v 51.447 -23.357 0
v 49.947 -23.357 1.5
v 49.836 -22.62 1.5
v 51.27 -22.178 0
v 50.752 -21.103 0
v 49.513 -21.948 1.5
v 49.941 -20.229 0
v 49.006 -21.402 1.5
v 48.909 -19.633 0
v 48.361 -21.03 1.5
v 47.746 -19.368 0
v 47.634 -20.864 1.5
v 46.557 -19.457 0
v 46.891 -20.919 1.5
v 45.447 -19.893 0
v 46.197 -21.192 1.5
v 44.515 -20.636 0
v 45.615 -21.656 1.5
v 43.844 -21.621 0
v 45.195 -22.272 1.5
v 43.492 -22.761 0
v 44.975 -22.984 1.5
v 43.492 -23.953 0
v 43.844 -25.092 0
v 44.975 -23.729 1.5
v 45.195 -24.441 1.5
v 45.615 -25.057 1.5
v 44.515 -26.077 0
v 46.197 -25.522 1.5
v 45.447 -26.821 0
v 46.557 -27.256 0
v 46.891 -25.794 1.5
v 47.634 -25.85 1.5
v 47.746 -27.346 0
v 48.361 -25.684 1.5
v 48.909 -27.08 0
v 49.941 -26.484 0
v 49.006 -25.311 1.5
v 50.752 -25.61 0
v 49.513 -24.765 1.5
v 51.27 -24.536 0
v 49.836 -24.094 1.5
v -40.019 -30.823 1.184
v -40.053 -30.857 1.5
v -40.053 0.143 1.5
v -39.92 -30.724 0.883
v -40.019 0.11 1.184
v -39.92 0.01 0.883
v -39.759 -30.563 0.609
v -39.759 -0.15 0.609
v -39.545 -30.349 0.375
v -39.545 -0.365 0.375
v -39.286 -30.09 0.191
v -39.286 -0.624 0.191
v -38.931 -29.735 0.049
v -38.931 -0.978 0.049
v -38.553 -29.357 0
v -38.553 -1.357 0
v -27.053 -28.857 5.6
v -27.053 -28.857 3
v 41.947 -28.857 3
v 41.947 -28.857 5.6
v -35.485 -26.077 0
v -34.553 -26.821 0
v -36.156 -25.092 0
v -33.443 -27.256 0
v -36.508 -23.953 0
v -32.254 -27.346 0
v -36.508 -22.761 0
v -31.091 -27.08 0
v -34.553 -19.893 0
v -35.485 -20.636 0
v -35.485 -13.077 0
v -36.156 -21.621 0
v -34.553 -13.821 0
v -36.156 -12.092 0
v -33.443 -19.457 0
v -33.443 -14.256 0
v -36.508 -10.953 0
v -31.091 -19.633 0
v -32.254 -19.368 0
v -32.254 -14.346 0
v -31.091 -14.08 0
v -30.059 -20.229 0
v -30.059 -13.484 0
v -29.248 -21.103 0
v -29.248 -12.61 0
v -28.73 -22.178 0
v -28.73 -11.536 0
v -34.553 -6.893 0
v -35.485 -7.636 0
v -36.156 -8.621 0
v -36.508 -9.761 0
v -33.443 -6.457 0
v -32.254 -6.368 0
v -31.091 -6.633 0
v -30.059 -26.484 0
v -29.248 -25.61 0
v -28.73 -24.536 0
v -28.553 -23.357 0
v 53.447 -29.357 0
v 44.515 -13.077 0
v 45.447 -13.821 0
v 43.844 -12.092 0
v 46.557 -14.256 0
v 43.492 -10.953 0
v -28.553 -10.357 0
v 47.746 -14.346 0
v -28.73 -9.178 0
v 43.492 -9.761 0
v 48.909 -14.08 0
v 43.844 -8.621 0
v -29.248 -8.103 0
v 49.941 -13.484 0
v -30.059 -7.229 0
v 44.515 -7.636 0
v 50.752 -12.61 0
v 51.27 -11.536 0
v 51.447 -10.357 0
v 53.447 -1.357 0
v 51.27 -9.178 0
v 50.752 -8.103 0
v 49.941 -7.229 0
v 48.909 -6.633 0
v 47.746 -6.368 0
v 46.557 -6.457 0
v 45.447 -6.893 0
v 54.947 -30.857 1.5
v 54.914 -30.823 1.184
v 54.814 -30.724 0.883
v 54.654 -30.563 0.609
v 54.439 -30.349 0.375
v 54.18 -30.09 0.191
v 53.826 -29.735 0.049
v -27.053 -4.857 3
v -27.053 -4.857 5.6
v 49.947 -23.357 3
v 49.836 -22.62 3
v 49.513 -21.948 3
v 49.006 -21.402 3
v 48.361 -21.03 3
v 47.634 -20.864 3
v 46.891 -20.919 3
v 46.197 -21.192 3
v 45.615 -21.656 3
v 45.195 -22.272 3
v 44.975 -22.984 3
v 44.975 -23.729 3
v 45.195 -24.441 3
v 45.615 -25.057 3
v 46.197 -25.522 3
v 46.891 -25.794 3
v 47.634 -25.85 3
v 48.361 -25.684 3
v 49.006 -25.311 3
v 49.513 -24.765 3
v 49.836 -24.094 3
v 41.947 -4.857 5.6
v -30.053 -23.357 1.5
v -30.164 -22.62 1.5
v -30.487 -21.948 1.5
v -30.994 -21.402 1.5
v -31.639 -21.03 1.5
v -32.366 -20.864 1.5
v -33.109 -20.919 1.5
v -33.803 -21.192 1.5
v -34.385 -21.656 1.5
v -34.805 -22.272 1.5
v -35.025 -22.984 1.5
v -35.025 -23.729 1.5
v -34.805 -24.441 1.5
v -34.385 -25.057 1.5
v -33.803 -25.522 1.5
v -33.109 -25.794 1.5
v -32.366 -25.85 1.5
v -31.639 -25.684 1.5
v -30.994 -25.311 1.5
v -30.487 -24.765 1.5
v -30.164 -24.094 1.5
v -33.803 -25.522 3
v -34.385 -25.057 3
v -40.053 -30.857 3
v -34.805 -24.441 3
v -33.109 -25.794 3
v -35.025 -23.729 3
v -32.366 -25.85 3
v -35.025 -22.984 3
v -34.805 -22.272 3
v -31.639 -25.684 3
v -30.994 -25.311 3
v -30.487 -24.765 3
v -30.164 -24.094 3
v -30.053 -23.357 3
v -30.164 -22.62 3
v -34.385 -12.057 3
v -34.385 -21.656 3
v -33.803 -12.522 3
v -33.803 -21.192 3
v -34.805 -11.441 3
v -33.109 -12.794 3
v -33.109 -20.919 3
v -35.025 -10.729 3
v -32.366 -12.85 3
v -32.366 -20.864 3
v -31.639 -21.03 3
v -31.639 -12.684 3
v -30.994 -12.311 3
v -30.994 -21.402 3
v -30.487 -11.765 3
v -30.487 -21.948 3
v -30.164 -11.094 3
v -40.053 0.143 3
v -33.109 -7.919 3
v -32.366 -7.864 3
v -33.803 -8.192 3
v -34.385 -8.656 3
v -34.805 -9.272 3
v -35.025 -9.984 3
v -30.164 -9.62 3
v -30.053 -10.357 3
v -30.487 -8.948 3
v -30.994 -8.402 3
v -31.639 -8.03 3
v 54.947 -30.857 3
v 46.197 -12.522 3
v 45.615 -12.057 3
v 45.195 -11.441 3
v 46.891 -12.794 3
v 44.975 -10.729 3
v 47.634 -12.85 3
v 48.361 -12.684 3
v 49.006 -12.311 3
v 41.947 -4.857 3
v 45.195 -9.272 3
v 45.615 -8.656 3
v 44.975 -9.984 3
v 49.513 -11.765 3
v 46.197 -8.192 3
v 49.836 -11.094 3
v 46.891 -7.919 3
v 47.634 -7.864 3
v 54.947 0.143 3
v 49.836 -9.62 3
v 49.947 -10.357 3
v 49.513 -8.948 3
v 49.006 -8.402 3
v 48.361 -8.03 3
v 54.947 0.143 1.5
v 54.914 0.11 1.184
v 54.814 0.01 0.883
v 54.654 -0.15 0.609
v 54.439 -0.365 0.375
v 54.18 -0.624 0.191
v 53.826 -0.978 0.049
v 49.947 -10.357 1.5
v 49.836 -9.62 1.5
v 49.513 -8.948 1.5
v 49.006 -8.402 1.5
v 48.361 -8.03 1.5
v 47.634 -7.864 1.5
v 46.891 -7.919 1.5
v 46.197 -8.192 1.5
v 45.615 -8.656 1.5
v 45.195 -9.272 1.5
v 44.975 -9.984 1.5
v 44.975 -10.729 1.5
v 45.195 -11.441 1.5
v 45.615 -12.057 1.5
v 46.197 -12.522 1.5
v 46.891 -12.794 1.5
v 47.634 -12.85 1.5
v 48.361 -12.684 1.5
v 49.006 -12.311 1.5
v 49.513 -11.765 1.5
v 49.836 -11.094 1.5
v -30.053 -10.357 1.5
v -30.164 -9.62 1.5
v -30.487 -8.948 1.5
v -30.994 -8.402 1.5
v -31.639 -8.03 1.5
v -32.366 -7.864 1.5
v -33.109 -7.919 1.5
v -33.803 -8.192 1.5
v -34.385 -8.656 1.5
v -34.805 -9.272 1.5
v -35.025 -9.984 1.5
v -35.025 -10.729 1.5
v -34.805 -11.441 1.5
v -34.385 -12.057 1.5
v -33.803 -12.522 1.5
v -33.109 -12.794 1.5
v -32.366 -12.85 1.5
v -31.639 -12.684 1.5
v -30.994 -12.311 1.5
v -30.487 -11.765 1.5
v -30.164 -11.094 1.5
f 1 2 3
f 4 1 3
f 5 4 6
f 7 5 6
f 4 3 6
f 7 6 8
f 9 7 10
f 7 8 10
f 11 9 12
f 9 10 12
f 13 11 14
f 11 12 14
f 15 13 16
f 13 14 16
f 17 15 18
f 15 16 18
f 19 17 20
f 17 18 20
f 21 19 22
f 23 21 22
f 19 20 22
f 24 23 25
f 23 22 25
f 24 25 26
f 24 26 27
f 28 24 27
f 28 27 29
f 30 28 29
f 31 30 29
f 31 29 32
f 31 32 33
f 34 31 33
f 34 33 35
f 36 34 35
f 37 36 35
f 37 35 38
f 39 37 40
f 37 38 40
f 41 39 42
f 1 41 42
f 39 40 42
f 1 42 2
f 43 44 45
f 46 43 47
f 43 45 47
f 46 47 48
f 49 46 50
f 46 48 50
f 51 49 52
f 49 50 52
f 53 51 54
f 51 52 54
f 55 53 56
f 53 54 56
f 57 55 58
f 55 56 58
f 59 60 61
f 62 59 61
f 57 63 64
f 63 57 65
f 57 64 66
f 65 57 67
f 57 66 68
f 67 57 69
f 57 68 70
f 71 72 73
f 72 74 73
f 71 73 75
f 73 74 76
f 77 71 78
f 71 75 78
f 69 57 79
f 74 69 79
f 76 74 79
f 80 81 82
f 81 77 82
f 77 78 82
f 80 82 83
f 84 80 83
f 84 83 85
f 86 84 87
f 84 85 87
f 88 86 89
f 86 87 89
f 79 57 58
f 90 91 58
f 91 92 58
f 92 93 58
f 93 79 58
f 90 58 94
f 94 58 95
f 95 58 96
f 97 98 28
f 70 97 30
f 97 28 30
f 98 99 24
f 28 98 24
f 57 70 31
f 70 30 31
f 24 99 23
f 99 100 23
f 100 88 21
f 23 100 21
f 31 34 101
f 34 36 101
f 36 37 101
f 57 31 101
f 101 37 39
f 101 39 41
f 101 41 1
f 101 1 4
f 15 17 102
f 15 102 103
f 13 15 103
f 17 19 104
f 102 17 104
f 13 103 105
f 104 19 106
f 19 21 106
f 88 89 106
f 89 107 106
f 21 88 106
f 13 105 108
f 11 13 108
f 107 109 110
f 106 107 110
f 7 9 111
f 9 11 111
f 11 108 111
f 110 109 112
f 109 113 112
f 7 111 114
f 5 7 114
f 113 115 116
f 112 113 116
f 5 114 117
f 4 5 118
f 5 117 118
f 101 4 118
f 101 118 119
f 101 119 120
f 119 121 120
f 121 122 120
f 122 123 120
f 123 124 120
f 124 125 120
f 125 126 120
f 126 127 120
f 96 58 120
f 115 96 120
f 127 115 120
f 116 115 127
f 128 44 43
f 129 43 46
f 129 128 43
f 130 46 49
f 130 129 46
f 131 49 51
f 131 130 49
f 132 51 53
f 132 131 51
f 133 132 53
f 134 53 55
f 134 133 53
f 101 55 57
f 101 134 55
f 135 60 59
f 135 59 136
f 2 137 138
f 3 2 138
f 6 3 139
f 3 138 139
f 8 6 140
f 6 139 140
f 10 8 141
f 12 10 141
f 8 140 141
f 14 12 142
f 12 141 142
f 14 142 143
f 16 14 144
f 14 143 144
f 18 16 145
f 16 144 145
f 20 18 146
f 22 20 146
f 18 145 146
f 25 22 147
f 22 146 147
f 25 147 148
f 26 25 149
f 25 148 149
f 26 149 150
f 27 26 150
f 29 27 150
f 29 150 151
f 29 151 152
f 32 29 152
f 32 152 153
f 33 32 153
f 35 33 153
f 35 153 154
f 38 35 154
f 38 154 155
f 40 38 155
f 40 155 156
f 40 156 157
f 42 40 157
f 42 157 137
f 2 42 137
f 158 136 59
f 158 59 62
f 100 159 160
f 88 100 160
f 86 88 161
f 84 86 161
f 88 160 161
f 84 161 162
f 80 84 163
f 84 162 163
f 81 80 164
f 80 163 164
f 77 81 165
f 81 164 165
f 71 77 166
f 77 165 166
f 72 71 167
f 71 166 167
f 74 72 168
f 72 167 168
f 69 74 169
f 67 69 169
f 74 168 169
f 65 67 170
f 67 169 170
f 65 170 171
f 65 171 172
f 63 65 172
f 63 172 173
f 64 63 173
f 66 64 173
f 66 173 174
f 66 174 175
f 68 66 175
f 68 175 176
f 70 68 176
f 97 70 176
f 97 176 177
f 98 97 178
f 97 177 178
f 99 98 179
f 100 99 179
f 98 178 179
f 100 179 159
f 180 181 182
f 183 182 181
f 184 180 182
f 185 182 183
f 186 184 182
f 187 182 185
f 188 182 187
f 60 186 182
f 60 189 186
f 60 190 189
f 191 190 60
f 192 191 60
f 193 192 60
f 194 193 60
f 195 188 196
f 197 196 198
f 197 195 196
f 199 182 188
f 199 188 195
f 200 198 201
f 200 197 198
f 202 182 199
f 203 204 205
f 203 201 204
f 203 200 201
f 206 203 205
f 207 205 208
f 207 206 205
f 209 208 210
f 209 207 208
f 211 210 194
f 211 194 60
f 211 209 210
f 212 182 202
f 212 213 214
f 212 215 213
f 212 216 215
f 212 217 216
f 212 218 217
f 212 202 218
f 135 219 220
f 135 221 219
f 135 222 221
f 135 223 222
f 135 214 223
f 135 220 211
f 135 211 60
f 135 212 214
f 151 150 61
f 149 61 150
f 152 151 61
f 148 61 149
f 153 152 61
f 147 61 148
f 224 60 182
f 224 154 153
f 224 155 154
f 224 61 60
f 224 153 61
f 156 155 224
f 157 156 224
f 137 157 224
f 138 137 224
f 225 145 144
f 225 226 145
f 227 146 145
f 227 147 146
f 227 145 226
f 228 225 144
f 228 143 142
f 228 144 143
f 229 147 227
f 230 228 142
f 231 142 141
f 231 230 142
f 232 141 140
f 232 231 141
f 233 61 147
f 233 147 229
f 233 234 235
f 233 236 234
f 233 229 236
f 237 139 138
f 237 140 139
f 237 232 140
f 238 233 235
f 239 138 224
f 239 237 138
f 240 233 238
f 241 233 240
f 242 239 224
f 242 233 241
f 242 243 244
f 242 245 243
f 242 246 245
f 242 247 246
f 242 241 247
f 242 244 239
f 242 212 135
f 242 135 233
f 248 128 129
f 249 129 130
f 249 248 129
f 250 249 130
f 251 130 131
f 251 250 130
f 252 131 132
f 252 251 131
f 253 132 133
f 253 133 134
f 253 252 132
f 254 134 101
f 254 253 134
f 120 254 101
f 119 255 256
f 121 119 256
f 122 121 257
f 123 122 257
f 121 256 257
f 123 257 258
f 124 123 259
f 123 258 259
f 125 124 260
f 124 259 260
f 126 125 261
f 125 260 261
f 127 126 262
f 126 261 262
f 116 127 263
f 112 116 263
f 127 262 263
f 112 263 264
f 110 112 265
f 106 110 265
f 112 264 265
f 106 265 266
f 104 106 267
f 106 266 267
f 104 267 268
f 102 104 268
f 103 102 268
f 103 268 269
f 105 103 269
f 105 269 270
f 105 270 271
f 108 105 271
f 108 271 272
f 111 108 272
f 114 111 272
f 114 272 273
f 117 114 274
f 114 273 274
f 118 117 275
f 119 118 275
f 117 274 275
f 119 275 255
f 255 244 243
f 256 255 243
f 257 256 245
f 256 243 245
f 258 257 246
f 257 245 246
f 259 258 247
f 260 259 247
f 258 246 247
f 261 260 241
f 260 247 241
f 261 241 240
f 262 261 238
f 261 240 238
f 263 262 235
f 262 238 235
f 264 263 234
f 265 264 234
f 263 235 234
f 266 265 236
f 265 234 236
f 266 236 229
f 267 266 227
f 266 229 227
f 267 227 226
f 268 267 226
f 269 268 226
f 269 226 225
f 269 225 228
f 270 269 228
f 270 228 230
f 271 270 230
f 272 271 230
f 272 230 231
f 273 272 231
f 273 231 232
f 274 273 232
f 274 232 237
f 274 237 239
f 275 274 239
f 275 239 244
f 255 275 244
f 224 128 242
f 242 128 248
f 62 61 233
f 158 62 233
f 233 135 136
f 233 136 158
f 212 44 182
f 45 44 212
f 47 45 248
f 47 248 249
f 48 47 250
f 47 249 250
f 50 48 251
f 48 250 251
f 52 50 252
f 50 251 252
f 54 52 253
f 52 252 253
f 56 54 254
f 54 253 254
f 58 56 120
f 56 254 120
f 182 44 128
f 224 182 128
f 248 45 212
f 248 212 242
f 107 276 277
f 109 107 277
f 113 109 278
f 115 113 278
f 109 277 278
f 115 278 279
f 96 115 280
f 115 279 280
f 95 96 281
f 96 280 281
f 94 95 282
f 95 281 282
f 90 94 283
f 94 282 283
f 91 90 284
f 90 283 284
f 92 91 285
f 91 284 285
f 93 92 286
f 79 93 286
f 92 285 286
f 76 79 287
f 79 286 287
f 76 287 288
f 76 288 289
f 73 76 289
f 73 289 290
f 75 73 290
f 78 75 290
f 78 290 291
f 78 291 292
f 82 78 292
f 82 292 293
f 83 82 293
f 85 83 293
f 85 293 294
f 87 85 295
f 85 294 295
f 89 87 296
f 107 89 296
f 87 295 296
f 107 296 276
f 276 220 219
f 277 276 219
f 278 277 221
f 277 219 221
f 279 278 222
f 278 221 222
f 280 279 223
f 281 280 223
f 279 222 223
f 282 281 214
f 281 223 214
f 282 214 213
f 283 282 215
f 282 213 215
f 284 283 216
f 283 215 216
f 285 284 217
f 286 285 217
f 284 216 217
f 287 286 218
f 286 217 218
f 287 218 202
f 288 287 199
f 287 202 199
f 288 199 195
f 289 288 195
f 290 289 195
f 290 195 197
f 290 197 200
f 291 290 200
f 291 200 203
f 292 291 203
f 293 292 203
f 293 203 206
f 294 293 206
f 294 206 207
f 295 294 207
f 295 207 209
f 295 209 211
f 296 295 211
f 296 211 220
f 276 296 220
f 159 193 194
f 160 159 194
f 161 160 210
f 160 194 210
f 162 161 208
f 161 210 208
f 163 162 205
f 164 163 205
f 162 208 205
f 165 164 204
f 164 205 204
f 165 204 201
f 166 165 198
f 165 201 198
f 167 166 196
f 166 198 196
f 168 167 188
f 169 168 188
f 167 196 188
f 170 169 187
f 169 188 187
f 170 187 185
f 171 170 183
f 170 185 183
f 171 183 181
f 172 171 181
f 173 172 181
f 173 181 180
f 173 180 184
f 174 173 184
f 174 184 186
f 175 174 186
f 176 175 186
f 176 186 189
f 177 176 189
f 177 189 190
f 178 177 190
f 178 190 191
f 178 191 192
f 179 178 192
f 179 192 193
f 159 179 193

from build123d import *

# Parameters (mm, degrees)
F0_W     = 95
F0_H     = 31
F0_W_2   = 69
F0_H_2   = 24
F1_DEPTH = 3
F2_DEPTH = 5.6
F3_R     = 1.5
F4_R     = 2.5
F5_DEPTH = 25
F6_SIZE  = 1.5


with BuildPart() as f1:
    # F0 (on Top) → F1 (new body)
    with BuildSketch(Plane.XY):
        with Locations((7.447391, -15.3567)):
            Rectangle(F0_W, F0_H)
        with Locations((7.447391, -16.8567)):
            Rectangle(F0_W_2, F0_H_2, mode=Mode.SUBTRACT)
    extrude(amount=F1_DEPTH)

    # F0 (on Top) → F2 (join)
    with BuildSketch(Plane.XY):
        with Locations((7.447391, -16.8567)):
            Rectangle(F0_W_2, F0_H_2)
    extrude(amount=F2_DEPTH)

    # F3
    f3_edges = [f1.edges().sort_by_distance(p)[0] for p in [
        (-40.052609, -15.3567, 0),
        (7.447391, 0.1433, 0),
        (7.447391, -30.8567, 0),
        (54.947391, -15.3567, 0),
    ]]
    fillet(f3_edges, radius=F3_R)

    # F4 (on face) → F5 (cut)
    with BuildSketch(Plane.XY.offset(5.6)):
        with Locations((-32.552609, -10.3567)):
            Circle(F4_R)
        with Locations((-32.552609, -23.3567)):
            Circle(F4_R)
        with Locations((47.447391, -23.3567)):
            Circle(F4_R)
        with Locations((47.447391, -10.3567)):
            Circle(F4_R)
    extrude(amount=-F5_DEPTH, mode=Mode.SUBTRACT)

    # F6
    f6_edges = [f1.edges().sort_by_distance(p)[0] for p in [
        (-38.552609, -15.3567, 0),
        (7.447391, -1.3567, 0),
        (7.447391, -29.3567, 0),
        (53.447391, -15.3567, 0),
        (-35.052609, -23.3567, 0),
        (44.947391, -23.3567, 0),
        (-35.052609, -10.3567, 0),
        (44.947391, -10.3567, 0),
    ]]
    chamfer(f6_edges, length=F6_SIZE)


solid = f1.part
